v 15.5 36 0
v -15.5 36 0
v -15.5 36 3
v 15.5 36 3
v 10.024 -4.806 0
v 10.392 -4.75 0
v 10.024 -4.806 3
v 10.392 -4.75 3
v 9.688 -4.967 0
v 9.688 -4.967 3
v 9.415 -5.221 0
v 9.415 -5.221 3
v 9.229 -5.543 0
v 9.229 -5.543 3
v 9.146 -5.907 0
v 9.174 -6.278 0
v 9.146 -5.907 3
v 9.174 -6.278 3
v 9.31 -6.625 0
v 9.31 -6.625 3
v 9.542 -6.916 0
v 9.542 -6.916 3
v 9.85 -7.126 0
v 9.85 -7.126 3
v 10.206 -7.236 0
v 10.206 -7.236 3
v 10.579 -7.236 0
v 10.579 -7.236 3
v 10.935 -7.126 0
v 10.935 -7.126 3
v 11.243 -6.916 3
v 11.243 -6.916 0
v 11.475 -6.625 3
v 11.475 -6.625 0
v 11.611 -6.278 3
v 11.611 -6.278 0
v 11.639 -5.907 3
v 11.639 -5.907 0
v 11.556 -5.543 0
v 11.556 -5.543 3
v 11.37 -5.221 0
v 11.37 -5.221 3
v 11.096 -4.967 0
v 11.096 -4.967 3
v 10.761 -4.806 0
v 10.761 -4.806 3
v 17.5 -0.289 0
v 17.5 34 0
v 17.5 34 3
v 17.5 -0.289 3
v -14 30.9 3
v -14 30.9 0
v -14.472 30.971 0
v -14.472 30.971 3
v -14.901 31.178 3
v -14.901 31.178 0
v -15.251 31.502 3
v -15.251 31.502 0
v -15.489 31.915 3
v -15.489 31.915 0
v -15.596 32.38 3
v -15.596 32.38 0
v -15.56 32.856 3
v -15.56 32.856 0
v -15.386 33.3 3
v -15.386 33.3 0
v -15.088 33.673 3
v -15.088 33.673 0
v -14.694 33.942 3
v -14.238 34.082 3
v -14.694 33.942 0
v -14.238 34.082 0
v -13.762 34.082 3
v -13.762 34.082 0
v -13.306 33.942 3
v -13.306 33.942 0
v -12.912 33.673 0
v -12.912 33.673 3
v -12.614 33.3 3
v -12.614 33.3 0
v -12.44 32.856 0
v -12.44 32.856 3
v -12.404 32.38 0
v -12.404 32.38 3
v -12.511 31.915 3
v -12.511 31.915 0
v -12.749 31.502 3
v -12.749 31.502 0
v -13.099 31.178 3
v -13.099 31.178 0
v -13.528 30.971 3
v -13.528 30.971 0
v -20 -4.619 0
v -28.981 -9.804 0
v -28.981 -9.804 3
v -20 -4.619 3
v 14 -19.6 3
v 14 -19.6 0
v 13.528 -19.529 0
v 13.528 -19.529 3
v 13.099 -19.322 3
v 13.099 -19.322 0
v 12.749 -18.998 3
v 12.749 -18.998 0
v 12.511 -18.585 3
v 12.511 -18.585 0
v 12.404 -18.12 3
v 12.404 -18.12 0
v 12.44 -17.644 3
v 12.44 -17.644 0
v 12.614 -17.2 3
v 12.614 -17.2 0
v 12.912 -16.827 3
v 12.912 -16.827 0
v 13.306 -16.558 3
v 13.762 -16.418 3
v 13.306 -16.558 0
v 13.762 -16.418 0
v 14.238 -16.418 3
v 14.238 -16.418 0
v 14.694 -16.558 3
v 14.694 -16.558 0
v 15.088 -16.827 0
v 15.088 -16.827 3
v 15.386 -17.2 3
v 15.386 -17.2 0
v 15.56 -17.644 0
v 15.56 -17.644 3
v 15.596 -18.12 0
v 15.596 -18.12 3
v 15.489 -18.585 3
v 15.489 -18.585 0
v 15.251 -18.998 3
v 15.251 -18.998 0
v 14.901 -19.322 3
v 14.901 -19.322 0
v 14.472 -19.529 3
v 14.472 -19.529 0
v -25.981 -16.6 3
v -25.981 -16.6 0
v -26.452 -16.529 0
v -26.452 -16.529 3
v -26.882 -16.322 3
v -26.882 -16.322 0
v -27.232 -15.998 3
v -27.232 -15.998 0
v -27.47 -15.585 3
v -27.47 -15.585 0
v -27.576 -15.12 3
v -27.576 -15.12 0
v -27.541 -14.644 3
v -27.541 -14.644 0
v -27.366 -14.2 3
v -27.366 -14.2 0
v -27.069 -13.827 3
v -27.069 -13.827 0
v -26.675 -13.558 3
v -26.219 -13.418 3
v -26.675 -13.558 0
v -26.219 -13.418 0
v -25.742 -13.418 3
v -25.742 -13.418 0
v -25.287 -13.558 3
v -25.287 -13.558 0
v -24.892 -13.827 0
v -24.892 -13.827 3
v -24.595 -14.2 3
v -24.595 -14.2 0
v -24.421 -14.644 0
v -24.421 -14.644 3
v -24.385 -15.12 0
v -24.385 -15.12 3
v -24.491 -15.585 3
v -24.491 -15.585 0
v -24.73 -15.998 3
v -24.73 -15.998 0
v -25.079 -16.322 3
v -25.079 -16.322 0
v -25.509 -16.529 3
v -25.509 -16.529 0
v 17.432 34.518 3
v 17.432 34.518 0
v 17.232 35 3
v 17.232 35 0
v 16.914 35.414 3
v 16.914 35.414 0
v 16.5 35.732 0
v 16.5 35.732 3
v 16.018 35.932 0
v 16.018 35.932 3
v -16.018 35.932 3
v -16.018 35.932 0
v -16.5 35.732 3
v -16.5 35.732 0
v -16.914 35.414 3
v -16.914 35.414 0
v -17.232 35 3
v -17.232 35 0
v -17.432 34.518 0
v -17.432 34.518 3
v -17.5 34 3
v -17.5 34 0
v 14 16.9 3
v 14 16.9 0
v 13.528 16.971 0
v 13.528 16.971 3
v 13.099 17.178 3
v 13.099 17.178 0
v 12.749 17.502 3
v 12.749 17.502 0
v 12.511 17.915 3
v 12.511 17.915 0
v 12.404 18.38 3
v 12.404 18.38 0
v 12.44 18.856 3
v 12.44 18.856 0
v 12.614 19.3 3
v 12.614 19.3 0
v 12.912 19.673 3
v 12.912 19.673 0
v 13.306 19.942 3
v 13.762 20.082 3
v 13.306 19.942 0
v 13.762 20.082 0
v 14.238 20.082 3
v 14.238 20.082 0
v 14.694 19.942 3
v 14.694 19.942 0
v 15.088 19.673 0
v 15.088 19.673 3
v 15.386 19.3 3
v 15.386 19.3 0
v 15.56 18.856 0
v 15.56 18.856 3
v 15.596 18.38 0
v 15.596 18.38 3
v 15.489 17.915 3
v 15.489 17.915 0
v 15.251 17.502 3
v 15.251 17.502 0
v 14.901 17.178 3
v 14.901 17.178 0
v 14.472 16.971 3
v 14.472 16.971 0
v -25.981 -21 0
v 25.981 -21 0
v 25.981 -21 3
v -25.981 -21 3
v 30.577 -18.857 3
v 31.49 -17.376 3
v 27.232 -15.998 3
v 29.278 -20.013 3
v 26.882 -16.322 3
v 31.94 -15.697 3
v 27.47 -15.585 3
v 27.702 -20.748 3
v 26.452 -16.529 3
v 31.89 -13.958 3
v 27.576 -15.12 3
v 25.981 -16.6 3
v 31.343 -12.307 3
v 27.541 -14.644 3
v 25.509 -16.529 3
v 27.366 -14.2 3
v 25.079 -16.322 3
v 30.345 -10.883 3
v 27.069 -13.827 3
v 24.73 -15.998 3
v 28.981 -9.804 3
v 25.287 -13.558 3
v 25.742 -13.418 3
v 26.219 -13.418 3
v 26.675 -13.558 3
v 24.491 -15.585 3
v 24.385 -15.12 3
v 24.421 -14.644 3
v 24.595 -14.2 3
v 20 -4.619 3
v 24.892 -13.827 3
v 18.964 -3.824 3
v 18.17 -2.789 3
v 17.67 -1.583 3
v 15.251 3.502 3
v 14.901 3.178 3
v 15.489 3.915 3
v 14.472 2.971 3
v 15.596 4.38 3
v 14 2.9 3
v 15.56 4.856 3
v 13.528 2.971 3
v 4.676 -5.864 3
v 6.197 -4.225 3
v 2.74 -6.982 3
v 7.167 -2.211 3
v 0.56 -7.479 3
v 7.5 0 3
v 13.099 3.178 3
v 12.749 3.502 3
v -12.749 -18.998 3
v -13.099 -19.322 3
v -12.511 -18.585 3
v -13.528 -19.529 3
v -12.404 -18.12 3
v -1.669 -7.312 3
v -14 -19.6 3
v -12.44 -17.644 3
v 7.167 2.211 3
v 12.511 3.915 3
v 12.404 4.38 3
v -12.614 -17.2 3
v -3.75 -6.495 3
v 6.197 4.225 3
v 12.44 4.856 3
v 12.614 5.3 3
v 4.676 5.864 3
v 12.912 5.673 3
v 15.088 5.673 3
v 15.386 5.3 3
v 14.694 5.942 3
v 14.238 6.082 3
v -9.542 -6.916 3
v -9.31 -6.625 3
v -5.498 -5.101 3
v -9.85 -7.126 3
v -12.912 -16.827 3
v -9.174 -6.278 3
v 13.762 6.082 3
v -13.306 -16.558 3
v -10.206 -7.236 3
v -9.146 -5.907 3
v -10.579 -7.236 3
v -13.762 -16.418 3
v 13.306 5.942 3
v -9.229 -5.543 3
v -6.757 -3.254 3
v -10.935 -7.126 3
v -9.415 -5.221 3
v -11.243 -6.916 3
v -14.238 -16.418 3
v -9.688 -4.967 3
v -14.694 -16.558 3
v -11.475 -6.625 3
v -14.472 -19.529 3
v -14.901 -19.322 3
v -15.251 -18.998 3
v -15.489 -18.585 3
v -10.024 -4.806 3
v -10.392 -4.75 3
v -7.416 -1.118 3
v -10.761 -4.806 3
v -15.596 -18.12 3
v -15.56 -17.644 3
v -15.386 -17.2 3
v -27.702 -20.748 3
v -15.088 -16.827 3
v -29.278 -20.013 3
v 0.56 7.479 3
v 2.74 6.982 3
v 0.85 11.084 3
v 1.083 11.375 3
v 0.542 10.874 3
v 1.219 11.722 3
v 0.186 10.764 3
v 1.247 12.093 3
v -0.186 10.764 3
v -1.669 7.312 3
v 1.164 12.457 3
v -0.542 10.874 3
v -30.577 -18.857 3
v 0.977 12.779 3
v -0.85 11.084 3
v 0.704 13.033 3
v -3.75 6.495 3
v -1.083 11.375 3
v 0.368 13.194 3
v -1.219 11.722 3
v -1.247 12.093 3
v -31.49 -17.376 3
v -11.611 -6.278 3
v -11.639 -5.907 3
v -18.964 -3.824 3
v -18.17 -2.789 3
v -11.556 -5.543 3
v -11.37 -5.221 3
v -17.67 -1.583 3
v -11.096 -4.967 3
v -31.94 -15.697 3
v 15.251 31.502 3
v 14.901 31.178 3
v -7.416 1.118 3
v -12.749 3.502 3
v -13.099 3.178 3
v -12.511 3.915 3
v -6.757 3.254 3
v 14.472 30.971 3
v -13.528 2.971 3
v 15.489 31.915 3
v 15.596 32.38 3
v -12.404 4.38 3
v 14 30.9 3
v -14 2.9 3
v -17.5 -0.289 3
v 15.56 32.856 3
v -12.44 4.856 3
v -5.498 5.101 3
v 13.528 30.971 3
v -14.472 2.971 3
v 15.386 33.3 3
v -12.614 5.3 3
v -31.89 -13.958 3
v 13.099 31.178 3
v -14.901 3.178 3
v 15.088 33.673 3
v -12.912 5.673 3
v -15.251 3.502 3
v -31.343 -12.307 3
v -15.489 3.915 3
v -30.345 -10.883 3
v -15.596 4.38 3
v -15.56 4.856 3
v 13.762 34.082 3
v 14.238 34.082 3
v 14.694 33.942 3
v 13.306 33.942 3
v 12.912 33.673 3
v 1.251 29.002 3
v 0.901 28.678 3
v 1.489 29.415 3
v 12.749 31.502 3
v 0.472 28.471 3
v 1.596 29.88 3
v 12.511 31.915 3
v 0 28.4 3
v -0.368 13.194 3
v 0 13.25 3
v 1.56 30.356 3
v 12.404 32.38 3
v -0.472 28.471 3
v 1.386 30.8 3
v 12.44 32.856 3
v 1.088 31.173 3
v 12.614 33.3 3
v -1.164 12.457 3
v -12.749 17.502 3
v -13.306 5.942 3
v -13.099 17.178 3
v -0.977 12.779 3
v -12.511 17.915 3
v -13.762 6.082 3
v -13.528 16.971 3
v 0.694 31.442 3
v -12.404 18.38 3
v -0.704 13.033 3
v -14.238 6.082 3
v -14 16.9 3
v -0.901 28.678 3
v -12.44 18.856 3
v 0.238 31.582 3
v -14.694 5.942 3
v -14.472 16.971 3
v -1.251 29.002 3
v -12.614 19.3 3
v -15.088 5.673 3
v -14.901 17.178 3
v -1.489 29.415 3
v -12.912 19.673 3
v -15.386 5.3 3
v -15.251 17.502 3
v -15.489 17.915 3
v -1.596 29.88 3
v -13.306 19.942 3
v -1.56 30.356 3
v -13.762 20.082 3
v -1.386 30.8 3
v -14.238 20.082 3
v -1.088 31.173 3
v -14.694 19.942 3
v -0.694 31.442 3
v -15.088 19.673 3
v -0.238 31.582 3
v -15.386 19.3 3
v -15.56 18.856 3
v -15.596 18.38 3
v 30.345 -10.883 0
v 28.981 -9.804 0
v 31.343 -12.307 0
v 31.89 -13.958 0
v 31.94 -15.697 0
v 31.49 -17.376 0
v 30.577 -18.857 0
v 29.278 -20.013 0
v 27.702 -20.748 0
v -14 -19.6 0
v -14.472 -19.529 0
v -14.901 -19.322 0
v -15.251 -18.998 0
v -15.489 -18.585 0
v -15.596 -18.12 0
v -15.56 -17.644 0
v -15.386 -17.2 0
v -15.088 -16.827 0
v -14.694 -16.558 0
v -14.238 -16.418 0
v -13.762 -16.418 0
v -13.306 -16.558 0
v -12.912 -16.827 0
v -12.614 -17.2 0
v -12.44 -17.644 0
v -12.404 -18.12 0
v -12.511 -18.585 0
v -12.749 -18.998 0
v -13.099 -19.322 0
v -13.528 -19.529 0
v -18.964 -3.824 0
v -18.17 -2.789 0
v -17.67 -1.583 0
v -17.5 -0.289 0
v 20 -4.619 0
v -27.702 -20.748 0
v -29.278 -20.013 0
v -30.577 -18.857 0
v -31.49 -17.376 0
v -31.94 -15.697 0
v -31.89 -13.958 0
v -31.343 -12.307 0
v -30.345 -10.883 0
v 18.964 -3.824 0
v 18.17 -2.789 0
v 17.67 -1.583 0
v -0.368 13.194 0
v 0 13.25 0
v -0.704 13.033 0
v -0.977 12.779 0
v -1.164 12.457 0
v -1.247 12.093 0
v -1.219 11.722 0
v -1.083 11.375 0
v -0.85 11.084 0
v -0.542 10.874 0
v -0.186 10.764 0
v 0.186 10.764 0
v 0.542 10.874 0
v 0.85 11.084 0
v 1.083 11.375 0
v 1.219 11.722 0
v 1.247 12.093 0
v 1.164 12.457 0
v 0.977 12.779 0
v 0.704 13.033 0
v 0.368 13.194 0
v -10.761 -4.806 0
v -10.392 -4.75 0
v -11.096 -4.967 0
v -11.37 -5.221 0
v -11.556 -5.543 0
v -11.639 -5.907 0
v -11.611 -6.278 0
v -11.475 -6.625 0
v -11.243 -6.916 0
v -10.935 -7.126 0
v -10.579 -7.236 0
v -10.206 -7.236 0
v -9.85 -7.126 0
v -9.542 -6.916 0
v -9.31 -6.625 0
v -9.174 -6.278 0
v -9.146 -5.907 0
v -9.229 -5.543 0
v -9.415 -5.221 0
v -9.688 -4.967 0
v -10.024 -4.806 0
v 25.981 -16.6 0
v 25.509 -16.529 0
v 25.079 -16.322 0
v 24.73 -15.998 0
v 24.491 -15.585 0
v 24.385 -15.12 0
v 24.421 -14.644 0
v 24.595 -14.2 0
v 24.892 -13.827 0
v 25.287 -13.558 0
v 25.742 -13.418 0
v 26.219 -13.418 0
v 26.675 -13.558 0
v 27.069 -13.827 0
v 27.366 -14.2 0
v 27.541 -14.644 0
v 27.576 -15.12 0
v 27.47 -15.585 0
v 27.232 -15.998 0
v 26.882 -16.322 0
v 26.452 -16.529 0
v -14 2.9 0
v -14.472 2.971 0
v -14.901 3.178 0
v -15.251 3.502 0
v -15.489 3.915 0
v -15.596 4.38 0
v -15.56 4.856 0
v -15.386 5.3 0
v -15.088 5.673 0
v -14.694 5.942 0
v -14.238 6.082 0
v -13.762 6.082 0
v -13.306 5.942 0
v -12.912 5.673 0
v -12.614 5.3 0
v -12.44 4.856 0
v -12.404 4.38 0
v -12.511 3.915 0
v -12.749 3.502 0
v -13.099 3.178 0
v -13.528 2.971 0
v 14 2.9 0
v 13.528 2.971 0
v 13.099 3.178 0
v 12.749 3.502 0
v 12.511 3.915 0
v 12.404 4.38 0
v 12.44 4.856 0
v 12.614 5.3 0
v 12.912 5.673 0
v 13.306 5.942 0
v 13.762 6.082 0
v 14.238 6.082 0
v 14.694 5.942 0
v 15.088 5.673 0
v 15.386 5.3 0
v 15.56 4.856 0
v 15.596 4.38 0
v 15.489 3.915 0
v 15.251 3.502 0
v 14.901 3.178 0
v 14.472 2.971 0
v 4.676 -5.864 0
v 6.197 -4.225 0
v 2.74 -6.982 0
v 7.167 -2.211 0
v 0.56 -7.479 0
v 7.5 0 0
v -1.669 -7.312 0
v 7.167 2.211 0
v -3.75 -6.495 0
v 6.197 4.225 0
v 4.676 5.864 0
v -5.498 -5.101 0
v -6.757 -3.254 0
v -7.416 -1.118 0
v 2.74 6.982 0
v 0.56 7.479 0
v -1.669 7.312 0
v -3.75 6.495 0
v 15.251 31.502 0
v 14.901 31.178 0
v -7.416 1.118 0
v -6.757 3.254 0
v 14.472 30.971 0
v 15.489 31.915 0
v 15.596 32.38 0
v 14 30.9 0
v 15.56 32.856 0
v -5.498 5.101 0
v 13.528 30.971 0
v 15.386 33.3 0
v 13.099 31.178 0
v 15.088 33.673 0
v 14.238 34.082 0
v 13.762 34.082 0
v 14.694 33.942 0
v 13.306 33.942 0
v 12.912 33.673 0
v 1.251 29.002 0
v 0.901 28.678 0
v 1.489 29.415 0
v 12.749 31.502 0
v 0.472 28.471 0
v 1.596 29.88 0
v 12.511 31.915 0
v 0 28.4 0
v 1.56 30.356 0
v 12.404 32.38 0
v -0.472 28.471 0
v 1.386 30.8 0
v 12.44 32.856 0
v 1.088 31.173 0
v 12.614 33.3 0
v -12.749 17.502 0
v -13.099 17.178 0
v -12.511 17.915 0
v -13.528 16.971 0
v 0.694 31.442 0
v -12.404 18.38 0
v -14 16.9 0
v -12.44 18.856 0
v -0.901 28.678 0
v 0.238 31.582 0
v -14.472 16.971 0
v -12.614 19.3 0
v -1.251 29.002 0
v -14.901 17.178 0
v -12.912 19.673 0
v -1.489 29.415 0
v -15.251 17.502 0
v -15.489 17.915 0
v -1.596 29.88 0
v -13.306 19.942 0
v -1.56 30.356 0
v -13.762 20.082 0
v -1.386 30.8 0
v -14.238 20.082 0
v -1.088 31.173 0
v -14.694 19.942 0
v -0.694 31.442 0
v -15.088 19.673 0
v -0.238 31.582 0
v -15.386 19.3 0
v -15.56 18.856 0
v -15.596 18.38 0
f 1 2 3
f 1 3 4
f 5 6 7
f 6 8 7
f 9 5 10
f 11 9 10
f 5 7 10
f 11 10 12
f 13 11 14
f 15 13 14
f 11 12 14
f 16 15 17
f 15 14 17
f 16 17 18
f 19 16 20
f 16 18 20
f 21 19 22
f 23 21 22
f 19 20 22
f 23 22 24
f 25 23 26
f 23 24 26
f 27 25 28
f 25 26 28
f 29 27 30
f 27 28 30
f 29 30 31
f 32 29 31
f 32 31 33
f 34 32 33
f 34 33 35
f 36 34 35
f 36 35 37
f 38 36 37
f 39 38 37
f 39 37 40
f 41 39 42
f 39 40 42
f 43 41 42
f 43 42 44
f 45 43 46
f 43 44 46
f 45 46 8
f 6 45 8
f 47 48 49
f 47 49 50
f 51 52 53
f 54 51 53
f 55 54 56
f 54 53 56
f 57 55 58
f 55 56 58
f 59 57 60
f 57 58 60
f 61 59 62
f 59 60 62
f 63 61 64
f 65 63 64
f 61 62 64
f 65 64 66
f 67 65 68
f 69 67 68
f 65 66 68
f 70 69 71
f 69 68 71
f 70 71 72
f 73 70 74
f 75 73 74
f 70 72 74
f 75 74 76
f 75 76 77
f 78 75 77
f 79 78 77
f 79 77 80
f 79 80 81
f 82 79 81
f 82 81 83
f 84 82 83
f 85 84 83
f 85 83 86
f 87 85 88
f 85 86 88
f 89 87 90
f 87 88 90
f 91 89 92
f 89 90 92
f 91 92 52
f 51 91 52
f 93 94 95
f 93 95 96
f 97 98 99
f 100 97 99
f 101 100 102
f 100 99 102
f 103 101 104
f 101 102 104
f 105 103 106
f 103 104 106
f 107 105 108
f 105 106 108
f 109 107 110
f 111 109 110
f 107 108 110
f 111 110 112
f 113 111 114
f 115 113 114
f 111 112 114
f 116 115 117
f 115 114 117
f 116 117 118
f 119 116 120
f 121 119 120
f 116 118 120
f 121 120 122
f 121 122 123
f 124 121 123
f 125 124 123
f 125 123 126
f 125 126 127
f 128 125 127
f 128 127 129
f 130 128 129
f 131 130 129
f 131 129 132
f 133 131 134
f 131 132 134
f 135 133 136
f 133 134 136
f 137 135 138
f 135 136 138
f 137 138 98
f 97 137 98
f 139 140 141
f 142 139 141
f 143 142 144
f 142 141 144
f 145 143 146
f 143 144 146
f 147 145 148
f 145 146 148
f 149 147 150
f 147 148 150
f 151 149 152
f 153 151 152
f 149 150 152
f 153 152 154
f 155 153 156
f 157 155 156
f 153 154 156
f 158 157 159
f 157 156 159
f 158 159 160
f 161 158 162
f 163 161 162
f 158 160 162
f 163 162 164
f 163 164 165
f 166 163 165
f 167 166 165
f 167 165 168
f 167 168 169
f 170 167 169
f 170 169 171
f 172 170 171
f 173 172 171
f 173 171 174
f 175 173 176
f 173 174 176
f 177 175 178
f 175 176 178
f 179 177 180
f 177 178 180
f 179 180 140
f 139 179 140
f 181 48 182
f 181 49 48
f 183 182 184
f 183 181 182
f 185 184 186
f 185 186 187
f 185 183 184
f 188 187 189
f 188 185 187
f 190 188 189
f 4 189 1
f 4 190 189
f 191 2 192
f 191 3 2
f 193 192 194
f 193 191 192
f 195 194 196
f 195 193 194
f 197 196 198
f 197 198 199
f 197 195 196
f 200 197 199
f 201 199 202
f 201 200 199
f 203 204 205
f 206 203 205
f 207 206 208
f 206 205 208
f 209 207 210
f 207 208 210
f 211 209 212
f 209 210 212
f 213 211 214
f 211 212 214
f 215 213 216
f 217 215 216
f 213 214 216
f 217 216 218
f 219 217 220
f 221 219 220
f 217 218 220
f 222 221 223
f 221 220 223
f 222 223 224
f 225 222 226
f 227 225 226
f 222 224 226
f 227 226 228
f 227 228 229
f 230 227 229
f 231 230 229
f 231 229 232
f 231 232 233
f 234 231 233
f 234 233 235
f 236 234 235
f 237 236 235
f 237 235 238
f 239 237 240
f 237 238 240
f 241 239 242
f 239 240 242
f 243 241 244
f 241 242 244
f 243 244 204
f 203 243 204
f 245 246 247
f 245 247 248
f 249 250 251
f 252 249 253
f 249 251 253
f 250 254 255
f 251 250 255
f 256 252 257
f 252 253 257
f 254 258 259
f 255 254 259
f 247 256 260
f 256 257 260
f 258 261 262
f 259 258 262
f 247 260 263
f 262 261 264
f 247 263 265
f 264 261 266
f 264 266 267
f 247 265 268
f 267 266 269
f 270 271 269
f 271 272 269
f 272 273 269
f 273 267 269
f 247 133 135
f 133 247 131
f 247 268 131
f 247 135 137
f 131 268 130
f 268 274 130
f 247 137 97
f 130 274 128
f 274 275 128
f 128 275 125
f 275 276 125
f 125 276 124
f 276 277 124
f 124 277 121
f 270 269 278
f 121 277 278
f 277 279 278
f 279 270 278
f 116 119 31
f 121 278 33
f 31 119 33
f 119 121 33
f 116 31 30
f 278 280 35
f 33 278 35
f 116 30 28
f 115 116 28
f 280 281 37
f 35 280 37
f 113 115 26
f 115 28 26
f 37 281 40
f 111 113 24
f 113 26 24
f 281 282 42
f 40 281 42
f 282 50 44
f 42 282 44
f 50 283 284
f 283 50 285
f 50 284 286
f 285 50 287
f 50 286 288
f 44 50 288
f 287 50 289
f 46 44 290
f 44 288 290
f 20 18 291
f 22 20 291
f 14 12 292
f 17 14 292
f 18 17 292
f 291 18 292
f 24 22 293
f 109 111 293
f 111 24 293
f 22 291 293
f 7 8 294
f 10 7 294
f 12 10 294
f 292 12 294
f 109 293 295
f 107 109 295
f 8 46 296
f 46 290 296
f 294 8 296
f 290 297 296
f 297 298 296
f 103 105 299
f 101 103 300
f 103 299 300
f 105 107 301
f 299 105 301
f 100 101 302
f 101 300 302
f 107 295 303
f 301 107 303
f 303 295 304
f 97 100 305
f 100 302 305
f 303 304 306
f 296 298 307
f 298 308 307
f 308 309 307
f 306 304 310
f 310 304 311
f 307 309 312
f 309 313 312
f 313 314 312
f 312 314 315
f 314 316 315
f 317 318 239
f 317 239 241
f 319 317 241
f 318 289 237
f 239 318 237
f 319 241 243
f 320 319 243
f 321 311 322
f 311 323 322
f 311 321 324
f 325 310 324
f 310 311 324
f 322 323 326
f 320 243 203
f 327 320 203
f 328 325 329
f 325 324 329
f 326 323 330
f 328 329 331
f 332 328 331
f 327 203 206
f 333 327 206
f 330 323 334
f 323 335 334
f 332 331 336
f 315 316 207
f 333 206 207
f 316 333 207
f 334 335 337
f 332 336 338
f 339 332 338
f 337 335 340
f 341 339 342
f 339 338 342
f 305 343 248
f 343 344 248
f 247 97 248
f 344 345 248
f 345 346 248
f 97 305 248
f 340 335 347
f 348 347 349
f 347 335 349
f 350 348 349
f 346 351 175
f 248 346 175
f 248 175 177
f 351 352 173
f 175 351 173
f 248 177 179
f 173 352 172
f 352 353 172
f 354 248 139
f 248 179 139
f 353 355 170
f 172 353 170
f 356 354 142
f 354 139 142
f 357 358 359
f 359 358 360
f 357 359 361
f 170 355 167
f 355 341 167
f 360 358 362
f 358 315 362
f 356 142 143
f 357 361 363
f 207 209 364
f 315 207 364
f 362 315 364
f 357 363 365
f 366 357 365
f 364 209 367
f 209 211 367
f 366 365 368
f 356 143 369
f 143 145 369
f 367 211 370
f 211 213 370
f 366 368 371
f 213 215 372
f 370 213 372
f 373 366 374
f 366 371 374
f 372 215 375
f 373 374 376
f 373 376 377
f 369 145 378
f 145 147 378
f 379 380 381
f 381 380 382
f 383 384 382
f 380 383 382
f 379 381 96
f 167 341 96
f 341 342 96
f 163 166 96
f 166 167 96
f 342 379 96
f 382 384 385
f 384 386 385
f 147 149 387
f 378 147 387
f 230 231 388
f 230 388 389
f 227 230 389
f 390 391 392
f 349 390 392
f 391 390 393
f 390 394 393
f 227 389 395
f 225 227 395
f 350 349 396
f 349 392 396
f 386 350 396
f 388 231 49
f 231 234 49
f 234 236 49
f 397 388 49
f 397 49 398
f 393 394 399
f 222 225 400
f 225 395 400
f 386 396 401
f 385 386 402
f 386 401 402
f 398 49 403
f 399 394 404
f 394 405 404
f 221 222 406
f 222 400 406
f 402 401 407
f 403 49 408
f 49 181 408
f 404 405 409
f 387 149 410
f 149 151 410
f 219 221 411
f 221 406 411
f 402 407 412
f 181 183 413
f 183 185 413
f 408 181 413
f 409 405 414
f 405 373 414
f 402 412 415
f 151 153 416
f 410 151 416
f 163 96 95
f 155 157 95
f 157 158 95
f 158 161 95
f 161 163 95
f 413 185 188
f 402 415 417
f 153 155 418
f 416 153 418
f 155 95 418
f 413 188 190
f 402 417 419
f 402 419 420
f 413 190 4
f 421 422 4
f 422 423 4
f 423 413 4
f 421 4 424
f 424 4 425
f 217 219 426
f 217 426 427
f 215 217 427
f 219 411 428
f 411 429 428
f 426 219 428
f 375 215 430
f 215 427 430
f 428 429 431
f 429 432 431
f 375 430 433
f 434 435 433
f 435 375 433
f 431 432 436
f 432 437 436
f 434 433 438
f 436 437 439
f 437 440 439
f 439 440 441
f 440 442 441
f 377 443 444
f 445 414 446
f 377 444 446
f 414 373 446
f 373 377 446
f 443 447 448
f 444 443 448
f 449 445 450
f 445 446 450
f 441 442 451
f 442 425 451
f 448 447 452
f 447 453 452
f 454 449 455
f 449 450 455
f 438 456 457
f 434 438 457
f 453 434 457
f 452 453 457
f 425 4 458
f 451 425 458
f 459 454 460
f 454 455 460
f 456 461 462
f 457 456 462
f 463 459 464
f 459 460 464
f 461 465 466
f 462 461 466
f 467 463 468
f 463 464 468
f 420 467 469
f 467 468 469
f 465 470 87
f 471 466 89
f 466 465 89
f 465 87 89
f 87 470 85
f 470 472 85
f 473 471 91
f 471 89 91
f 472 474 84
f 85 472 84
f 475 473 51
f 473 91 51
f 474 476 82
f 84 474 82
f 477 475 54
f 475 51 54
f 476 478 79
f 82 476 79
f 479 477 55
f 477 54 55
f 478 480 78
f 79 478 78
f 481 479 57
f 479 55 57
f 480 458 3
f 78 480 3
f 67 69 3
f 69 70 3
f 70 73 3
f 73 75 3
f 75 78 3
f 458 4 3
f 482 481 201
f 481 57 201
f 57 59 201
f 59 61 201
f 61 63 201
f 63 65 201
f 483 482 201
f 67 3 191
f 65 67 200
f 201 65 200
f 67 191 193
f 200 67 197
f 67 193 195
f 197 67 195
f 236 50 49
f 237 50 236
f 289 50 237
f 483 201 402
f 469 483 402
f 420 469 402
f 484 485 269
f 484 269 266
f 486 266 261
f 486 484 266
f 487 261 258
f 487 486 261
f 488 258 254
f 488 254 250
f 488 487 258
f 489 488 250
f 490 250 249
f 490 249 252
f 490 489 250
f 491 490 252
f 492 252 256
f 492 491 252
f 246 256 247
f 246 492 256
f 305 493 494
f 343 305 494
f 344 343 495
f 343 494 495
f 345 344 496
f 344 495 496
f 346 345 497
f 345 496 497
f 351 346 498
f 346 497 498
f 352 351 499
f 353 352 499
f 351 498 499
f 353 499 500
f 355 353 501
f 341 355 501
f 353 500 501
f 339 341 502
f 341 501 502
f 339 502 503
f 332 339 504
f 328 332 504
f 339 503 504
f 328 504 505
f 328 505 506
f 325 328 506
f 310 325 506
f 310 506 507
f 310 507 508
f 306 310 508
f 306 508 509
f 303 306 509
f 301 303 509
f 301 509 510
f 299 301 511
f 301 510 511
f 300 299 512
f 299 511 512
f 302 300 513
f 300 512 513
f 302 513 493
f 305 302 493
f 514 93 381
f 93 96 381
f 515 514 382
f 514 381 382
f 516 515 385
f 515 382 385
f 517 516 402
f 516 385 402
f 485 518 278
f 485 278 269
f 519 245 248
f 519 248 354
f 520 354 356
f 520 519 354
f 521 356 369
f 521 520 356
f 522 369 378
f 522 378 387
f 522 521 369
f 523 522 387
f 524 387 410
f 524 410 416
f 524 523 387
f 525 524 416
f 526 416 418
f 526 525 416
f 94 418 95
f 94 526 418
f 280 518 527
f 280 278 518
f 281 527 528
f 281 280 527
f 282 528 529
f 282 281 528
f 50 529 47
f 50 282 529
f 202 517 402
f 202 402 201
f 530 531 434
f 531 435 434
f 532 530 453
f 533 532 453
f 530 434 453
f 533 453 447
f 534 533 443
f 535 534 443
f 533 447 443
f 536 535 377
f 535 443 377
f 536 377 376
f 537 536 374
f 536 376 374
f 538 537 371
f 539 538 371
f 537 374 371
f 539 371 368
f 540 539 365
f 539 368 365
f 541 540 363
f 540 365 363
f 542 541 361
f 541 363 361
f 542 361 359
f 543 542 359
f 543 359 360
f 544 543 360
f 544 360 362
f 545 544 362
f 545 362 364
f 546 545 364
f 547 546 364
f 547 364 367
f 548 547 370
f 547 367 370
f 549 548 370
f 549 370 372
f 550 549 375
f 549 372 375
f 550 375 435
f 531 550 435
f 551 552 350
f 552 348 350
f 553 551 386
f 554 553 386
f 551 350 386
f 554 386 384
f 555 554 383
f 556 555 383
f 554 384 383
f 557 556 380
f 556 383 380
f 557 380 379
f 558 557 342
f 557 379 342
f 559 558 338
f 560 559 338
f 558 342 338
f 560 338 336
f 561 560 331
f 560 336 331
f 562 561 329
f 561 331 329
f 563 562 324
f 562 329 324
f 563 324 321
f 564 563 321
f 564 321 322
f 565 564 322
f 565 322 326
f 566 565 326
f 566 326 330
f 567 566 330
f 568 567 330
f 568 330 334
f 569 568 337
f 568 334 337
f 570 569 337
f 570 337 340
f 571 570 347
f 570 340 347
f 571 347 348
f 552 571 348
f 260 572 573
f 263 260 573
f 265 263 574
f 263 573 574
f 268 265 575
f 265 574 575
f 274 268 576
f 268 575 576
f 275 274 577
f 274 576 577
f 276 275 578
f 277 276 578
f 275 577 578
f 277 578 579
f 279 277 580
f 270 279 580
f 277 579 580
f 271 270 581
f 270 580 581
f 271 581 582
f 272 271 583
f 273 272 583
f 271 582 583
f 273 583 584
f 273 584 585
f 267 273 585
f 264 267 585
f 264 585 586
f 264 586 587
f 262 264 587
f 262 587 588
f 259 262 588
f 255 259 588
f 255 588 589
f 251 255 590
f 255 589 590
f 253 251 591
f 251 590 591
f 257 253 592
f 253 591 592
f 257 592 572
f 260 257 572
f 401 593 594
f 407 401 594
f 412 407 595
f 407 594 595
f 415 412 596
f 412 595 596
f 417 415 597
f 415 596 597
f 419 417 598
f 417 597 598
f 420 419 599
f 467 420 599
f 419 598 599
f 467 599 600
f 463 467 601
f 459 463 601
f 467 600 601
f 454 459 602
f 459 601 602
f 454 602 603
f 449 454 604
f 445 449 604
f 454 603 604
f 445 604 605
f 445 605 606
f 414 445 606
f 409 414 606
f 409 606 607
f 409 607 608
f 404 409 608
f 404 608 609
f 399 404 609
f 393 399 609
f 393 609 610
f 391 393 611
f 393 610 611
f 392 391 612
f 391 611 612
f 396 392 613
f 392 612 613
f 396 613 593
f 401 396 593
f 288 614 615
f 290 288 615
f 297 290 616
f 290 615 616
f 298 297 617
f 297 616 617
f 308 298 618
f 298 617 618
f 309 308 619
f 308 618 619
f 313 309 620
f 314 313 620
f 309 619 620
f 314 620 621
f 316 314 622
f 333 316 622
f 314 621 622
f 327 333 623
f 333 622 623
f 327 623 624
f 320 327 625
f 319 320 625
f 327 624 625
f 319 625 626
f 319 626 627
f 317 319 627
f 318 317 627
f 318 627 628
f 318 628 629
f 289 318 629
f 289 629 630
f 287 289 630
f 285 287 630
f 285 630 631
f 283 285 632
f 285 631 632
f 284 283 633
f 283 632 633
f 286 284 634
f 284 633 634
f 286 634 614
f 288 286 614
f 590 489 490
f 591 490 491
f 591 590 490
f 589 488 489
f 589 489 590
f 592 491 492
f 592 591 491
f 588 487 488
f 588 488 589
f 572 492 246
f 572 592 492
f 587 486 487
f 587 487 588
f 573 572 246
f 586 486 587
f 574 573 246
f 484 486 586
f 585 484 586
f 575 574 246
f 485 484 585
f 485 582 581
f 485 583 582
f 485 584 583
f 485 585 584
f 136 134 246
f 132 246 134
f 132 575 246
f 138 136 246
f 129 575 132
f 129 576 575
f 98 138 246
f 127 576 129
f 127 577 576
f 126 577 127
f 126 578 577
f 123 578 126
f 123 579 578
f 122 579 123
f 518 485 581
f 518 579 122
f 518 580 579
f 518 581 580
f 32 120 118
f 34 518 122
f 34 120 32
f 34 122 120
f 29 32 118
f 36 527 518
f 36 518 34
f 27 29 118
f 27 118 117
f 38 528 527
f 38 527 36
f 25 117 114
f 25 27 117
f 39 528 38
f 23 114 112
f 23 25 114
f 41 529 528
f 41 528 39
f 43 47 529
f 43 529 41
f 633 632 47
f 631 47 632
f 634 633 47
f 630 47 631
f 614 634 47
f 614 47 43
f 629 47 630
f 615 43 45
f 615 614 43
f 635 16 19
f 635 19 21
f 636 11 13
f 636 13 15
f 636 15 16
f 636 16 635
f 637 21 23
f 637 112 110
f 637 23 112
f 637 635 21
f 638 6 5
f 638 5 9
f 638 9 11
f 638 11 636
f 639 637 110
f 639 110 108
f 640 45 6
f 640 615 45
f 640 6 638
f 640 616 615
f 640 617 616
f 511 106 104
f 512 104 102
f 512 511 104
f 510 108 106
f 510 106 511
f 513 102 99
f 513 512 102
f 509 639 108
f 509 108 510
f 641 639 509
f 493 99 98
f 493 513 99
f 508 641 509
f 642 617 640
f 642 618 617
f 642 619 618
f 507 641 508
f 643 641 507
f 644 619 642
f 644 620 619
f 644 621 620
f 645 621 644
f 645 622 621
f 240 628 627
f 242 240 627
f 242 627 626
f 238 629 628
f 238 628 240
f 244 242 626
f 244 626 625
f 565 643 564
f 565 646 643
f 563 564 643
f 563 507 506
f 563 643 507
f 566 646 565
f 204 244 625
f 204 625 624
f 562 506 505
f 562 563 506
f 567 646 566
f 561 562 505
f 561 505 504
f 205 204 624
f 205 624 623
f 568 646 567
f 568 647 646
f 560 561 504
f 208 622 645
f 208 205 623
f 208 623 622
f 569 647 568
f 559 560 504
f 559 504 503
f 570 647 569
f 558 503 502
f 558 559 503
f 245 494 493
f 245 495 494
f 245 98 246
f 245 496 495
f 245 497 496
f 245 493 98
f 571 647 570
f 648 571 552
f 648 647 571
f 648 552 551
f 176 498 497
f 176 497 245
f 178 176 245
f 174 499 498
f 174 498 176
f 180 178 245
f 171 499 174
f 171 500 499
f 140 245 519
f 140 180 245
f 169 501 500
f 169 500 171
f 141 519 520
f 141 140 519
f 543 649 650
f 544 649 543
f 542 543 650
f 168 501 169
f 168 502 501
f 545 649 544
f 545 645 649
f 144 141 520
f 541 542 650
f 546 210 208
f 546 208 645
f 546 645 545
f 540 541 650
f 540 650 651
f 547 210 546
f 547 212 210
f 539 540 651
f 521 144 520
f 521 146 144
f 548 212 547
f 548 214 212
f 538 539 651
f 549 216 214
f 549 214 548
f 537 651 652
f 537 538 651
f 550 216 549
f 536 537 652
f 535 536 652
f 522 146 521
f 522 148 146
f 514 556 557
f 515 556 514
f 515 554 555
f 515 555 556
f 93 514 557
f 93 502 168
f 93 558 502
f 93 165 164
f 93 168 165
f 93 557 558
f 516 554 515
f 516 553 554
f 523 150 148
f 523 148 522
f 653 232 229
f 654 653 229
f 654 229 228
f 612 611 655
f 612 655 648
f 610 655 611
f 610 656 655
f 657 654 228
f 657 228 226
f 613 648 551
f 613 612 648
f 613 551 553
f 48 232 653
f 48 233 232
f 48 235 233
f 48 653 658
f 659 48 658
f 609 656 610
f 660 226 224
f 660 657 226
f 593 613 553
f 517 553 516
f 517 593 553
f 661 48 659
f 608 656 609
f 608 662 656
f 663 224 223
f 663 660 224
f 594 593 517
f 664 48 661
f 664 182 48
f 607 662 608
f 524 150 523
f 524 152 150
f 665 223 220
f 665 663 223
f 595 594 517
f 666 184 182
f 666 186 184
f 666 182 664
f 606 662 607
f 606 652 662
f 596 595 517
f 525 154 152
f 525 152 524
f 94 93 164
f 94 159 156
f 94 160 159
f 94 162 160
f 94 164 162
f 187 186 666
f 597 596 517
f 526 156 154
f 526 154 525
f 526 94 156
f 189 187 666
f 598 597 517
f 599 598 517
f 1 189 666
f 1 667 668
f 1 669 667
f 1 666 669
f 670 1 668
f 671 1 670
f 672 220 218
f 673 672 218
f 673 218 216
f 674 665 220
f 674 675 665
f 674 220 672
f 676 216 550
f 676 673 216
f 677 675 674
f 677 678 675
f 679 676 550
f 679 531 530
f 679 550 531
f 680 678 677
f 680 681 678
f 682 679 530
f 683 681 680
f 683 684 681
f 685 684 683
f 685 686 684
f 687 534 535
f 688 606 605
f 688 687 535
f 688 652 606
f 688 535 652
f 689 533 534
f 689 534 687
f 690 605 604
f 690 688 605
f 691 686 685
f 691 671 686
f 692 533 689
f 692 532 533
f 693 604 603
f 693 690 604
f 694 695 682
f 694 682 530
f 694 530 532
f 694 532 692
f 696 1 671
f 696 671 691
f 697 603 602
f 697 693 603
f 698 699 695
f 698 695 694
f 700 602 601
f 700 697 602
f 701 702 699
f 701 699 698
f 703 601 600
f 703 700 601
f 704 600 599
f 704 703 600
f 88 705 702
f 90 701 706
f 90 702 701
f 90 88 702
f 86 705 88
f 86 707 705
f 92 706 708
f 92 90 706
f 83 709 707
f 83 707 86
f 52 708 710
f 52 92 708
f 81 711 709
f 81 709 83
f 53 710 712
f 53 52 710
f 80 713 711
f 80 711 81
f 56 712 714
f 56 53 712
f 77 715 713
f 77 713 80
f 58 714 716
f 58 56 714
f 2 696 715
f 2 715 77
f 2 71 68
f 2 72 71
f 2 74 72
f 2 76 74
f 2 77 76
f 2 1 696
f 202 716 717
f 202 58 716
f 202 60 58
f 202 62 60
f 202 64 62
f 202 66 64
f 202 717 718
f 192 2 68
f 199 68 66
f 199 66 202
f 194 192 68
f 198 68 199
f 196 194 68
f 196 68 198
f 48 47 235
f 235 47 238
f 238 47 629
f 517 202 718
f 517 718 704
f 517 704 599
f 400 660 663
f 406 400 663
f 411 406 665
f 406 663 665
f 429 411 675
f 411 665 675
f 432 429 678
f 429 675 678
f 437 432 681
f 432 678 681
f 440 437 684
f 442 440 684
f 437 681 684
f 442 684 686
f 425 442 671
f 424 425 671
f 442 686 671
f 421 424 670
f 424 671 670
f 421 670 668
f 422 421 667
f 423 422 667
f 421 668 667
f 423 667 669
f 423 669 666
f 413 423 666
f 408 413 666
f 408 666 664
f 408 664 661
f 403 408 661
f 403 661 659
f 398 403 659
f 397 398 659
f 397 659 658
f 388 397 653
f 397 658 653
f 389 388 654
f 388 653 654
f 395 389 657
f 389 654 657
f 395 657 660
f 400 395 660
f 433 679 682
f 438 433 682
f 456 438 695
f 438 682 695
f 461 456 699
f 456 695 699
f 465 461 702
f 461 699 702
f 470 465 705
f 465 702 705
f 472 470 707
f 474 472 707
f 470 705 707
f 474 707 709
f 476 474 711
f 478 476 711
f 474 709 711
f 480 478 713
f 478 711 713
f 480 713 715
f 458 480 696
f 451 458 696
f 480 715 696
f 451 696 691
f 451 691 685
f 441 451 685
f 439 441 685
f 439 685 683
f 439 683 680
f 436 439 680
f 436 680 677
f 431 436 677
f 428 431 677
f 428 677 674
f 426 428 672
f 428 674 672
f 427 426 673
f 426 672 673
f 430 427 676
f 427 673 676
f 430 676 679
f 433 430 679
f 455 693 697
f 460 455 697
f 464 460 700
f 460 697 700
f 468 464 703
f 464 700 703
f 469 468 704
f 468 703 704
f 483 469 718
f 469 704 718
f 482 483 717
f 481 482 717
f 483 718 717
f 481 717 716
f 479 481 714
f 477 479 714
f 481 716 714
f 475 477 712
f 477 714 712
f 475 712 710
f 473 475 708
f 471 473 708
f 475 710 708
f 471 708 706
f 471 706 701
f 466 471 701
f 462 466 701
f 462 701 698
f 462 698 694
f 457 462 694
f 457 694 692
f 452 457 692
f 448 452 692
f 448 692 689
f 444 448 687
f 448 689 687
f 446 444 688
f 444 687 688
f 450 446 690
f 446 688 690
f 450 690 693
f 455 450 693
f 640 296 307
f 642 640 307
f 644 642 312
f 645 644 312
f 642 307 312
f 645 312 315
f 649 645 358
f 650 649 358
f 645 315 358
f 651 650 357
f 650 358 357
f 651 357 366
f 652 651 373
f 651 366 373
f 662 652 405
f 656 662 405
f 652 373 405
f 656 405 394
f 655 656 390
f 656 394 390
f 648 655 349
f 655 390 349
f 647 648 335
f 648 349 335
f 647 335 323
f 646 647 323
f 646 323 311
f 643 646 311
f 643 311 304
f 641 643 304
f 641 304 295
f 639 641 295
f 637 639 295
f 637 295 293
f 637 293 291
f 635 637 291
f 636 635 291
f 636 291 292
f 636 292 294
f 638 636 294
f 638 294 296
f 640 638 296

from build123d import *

# Parameters (mm, degrees)
CHAMFER1_SIZE                  = 1
CHAMFER1_SIZE2                 = 2.747477419
CIRPATTERN2_COUNT              = 3
BOSS_EXTRUDE1_DEPTH            = 3
SKETCH4_R                      = 7.5
CUT_EXTRUDE1_DEPTH             = 49.603797643
SKETCH6_W                      = 1.25
SKETCH6_H                      = 3
M3X0_5_TAPPED_HOLE2_AT_2_COUNT = 2
M3X0_5_TAPPED_HOLE2_AT_2_PITCH = 20.784609691
M3X0_5_TAPPED_HOLE2_AT_3_COUNT = 2
M3X0_5_TAPPED_HOLE2_AT_3_PITCH = 20.784609691
FILLET1_R                      = 5
FILLET2_R                      = 2
SKETCH9_W                      = 1.6
SKETCH9_H                      = 6.6
M3_CLEARANCE_HOLE3_AT_2_COUNT  = 2
M3_CLEARANCE_HOLE3_AT_2_PITCH  = 14
M3_CLEARANCE_HOLE3_AT_3_COUNT  = 2
M3_CLEARANCE_HOLE3_AT_3_PITCH  = 28
M3_CLEARANCE_HOLE3_AT_4_COUNT  = 2
M3_CLEARANCE_HOLE3_AT_4_PITCH  = 50.5
M3_CLEARANCE_HOLE3_AT_5_COUNT  = 2
M3_CLEARANCE_HOLE3_AT_5_PITCH  = 57.742964939
M3_CLEARANCE_HOLE3_AT_6_COUNT  = 2
M3_CLEARANCE_HOLE3_AT_6_PITCH  = 39.597979746
M3_CLEARANCE_HOLE3_AT_7_COUNT  = 2
M3_CLEARANCE_HOLE3_AT_7_PITCH  = 31.304951685
M3_CLEARANCE_HOLE3_AT_8_COUNT  = 2
M3_CLEARANCE_HOLE3_AT_8_PITCH  = 28
SKETCH13_W                     = 1.6
SKETCH13_H                     = 6.6
M3_CLEARANCE_HOLE2_AT_2_COUNT  = 2
M3_CLEARANCE_HOLE2_AT_2_PITCH  = 51.961524227
M3_CLEARANCE_HOLE2_AT_3_COUNT  = 2
M3_CLEARANCE_HOLE2_AT_3_PITCH  = 51.961524227
CHAMFER2_SIZE                  = 0.4
CHAMFER3_SIZE                  = 0.4
CHAMFER4_SIZE                  = 0.4


with BuildPart() as part:
    # Sketch3 → Revolve1 (revolve)
    with BuildSketch(Plane(origin=(0, 0, 0), x_dir=(0, 0, -1), z_dir=(1, 0, 0)), mode=Mode.PRIVATE) as revolve1_sk:
        with BuildLine():
            Line((0, 31.6), (0.233939444, 31.6))
            ThreePointArc((0.233939444, 31.6), (1.585065492, 33.262066557), (3.6, 33.988734135))
            Line((3.6, 33.988734135), (3.6, 35.988734135))
            Line((3.6, 35.988734135), (0, 35.988734135))
            Line((0, 35.988734135), (0, 31.6))
        make_face()
    revolve(revolve1_sk.sketch.rotate(Axis((0, 30, 0), (0, 0, -1)), 90), axis=Axis((0, 30, 0), (0, 0, -1)))

    # Chamfer1
    chamfer1_edges = [part.edges().sort_by_distance(p)[0] for p in [
        (-5.988734135, 30, -3.6),
    ]]
    chamfer1_side = [part.faces().sort_by_distance(p)[0] for p in [
        (-4.158121116, 30, -3.6),
    ]]
    chamfer(chamfer1_edges, length=CHAMFER1_SIZE, length2=CHAMFER1_SIZE2, reference=chamfer1_side[0])


with BuildPart() as cirpattern2_1:
    # CirPattern2: pattern copy
    add(part.part.rotate(Axis((0, 0, 0), (0, 0, 1)), 1 * 360 / CIRPATTERN2_COUNT))

    # Chamfer4
    # the kernel refuses this chamfer: 0.4 mm, written as the material it takes off along each edge
    with BuildSketch(Plane(origin=(-25.980762114, -15, 0), x_dir=(-0.5000000000000001, 0.8660254037844387, 0), z_dir=(-0.8660254037844387, -0.5000000000000001, 0))) as chamfer4_piece_1:
        Polygon((5.988734135, CHAMFER4_SIZE), (5.988734135 - CHAMFER4_SIZE, 0), (5.988734135, 0), align=None)
    revolve(axis=Axis((-25.980762114, -15, 0), (0, 0, -1)), mode=Mode.SUBTRACT)
    with BuildSketch(Plane(origin=(-25.980762114, -15, 0), x_dir=(-0.4999999999999992, 0.866025403784439, 0), z_dir=(-0.866025403784439, -0.4999999999999992, 0))) as chamfer4_piece_2:
        Polygon((1.6, CHAMFER4_SIZE), (1.6 + CHAMFER4_SIZE, 0), (1.6, 0), align=None)
    revolve(axis=Axis((-25.980762114, -15, 0), (0, 0, -1)), mode=Mode.SUBTRACT)


with BuildPart() as cirpattern2_2:
    # CirPattern2: pattern copy
    add(part.part.rotate(Axis((0, 0, 0), (0, 0, 1)), 2 * 360 / CIRPATTERN2_COUNT))

    # Chamfer2
    # the kernel refuses this chamfer: 0.4 mm, written as the material it takes off along each edge
    with BuildSketch(Plane(origin=(25.980762114, -15, 0), x_dir=(-0.5000000000000006, -0.8660254037844384, 0), z_dir=(0.8660254037844384, -0.5000000000000006, 0))) as chamfer2_piece_1:
        Polygon((5.988734135, CHAMFER2_SIZE), (5.988734135 - CHAMFER2_SIZE, 0), (5.988734135, 0), align=None)
    revolve(axis=Axis((25.980762114, -15, 0), (0, 0, -1)), mode=Mode.SUBTRACT)
    with BuildSketch(Plane(origin=(25.980762114, -15, 0), x_dir=(-0.5000000000000004, -0.8660254037844384, 0), z_dir=(0.8660254037844384, -0.5000000000000004, 0))) as chamfer2_piece_2:
        Polygon((1.6, CHAMFER2_SIZE), (1.6 + CHAMFER2_SIZE, 0), (1.6, 0), align=None)
    revolve(axis=Axis((25.980762114, -15, 0), (0, 0, -1)), mode=Mode.SUBTRACT)


with BuildPart() as body_4:
    # Sketch1 → Boss-Extrude1 (new body)
    with BuildSketch(Plane.XY):
        with BuildLine():
            Line((25.980762114, -21), (-25.980762114, -21))
            ThreePointArc((-25.980762114, -21), (-31.776317071, -16.552914271), (-28.980762114, -9.803847577))
            Line((-28.980762114, -9.803847577), (-17.5, -3.175426481))
            Line((-17.5, -3.175426481), (-17.5, 36))
            Line((-17.5, 36), (17.5, 36))
            Line((17.5, 36), (17.5, -3.175426481))
            Line((17.5, -3.175426481), (28.980762114, -9.803847577))
            ThreePointArc((28.980762114, -9.803847577), (31.776317071, -16.552914271), (25.980762114, -21))
        make_face()
    extrude(amount=BOSS_EXTRUDE1_DEPTH)

    # Sketch4 → Cut-Extrude1 (cut, through all)
    with BuildSketch(Plane.XY.offset(3)):
        Circle(SKETCH4_R)
    extrude(amount=-CUT_EXTRUDE1_DEPTH, mode=Mode.SUBTRACT)

    # Sketch6 → M3x0.5 Tapped Hole2 (revolve, cut)
    with BuildSketch(Plane(origin=(-10.392304845, -6, 0), x_dir=(0, 1, 0), z_dir=(1, 0, 0))):
        with Locations((0.625, 1.5)):
            Rectangle(SKETCH6_W, SKETCH6_H)
    m3x0_5_tapped_hole2 = revolve(axis=Axis((-10.392304845, -6, -6.35), (0, 0, 1)), mode=Mode.SUBTRACT)

    # M3x0.5 Tapped Hole2 at 2: M3x0.5 Tapped Hole2 ×2
    with Locations(*[Vector(0.49999999999999795, 0.8660254037844399, 0) * (i * M3X0_5_TAPPED_HOLE2_AT_2_PITCH) for i in range(1, M3X0_5_TAPPED_HOLE2_AT_2_COUNT)]):
        add(m3x0_5_tapped_hole2, mode=Mode.SUBTRACT)

    # M3x0.5 Tapped Hole2 at 3: M3x0.5 Tapped Hole2 ×2
    with Locations(*[(i * M3X0_5_TAPPED_HOLE2_AT_3_PITCH, 0, 0) for i in range(1, M3X0_5_TAPPED_HOLE2_AT_3_COUNT)]):
        add(m3x0_5_tapped_hole2, mode=Mode.SUBTRACT)

    # Fillet1
    fillet1_edges = [body_4.edges().sort_by_distance(p)[0] for p in [
        (-17.5, -3.175426481, 1.5),
        (17.5, -3.175426481, 1.5),
    ]]
    fillet(fillet1_edges, radius=FILLET1_R)

    # Fillet2
    fillet2_edges = [body_4.edges().sort_by_distance(p)[0] for p in [
        (-17.5, 36, 1.5),
        (17.5, 36, 1.5),
    ]]
    fillet(fillet2_edges, radius=FILLET2_R)

    # Sketch9 → M3 Clearance Hole3 (revolve, cut)
    with BuildSketch(Plane(origin=(14, 32.5, 3), x_dir=(0, -1, 0), z_dir=(1, 0, 0))):
        with Locations((0.8, 3.3)):
            Rectangle(SKETCH9_W, SKETCH9_H)
    m3_clearance_hole3 = revolve(axis=Axis((14, 32.5, 9.35), (0, 0, -1)), mode=Mode.SUBTRACT)

    # M3 Clearance Hole3 at 2: M3 Clearance Hole3 ×2
    with Locations(*[(0, -i * M3_CLEARANCE_HOLE3_AT_2_PITCH, 0) for i in range(1, M3_CLEARANCE_HOLE3_AT_2_COUNT)]):
        add(m3_clearance_hole3, mode=Mode.SUBTRACT)

    # M3 Clearance Hole3 at 3: M3 Clearance Hole3 ×2
    with Locations(*[(0, -i * M3_CLEARANCE_HOLE3_AT_3_PITCH, 0) for i in range(1, M3_CLEARANCE_HOLE3_AT_3_COUNT)]):
        add(m3_clearance_hole3, mode=Mode.SUBTRACT)

    # M3 Clearance Hole3 at 4: M3 Clearance Hole3 ×2
    with Locations(*[(0, -i * M3_CLEARANCE_HOLE3_AT_4_PITCH, 0) for i in range(1, M3_CLEARANCE_HOLE3_AT_4_COUNT)]):
        add(m3_clearance_hole3, mode=Mode.SUBTRACT)

    # M3 Clearance Hole3 at 5: M3 Clearance Hole3 ×2
    with Locations(*[Vector(-0.48490755591360857, -0.8745654133441881, 0) * (i * M3_CLEARANCE_HOLE3_AT_5_PITCH) for i in range(1, M3_CLEARANCE_HOLE3_AT_5_COUNT)]):
        add(m3_clearance_hole3, mode=Mode.SUBTRACT)

    # M3 Clearance Hole3 at 6: M3 Clearance Hole3 ×2
    with Locations(*[Vector(-0.7071067811865479, -0.7071067811865472, 0) * (i * M3_CLEARANCE_HOLE3_AT_6_PITCH) for i in range(1, M3_CLEARANCE_HOLE3_AT_6_COUNT)]):
        add(m3_clearance_hole3, mode=Mode.SUBTRACT)

    # M3 Clearance Hole3 at 7: M3 Clearance Hole3 ×2
    with Locations(*[Vector(-0.8944271909999161, -0.4472135954999577, 0) * (i * M3_CLEARANCE_HOLE3_AT_7_PITCH) for i in range(1, M3_CLEARANCE_HOLE3_AT_7_COUNT)]):
        add(m3_clearance_hole3, mode=Mode.SUBTRACT)

    # M3 Clearance Hole3 at 8: M3 Clearance Hole3 ×2
    with Locations(*[(-i * M3_CLEARANCE_HOLE3_AT_8_PITCH, 0, 0) for i in range(1, M3_CLEARANCE_HOLE3_AT_8_COUNT)]):
        add(m3_clearance_hole3, mode=Mode.SUBTRACT)

    # Sketch13 → M3 Clearance Hole2 (revolve, cut)
    with BuildSketch(Plane(origin=(0, 30, 3), x_dir=(0, -1, 0), z_dir=(1, 0, 0))):
        with Locations((0.8, 3.3)):
            Rectangle(SKETCH13_W, SKETCH13_H)
    m3_clearance_hole2 = revolve(axis=Axis((0, 30, 9.35), (0, 0, -1)), mode=Mode.SUBTRACT)

    # M3 Clearance Hole2 at 2: M3 Clearance Hole2 ×2
    with Locations(*[Vector(0.49999999999999795, -0.8660254037844398, 0) * (i * M3_CLEARANCE_HOLE2_AT_2_PITCH) for i in range(1, M3_CLEARANCE_HOLE2_AT_2_COUNT)]):
        add(m3_clearance_hole2, mode=Mode.SUBTRACT)

    # M3 Clearance Hole2 at 3: M3 Clearance Hole2 ×2
    with Locations(*[Vector(-0.49999999999999784, -0.8660254037844399, 0) * (i * M3_CLEARANCE_HOLE2_AT_3_PITCH) for i in range(1, M3_CLEARANCE_HOLE2_AT_3_COUNT)]):
        add(m3_clearance_hole2, mode=Mode.SUBTRACT)


with BuildPart() as part_1:
    add(part.part)

    # Chamfer3
    # the kernel refuses this chamfer: 0.4 mm, written as the material it takes off along each edge
    with BuildSketch(Plane(origin=(0, 30, 0), x_dir=(1, 0, 0), z_dir=(0, 1, 0))) as chamfer3_piece_1:
        Polygon((5.988734135, CHAMFER3_SIZE), (5.988734135 - CHAMFER3_SIZE, 0), (5.988734135, 0), align=None)
    revolve(axis=Axis((0, 30, 0), (0, 0, -1)), mode=Mode.SUBTRACT)
    with BuildSketch(Plane(origin=(0, 30, 0), x_dir=(1, 0, 0), z_dir=(0, 1, 0))) as chamfer3_piece_2:
        Polygon((1.6, CHAMFER3_SIZE), (1.6 + CHAMFER3_SIZE, 0), (1.6, 0), align=None)
    revolve(axis=Axis((0, 30, 0), (0, 0, -1)), mode=Mode.SUBTRACT)


solid = body_4.part
